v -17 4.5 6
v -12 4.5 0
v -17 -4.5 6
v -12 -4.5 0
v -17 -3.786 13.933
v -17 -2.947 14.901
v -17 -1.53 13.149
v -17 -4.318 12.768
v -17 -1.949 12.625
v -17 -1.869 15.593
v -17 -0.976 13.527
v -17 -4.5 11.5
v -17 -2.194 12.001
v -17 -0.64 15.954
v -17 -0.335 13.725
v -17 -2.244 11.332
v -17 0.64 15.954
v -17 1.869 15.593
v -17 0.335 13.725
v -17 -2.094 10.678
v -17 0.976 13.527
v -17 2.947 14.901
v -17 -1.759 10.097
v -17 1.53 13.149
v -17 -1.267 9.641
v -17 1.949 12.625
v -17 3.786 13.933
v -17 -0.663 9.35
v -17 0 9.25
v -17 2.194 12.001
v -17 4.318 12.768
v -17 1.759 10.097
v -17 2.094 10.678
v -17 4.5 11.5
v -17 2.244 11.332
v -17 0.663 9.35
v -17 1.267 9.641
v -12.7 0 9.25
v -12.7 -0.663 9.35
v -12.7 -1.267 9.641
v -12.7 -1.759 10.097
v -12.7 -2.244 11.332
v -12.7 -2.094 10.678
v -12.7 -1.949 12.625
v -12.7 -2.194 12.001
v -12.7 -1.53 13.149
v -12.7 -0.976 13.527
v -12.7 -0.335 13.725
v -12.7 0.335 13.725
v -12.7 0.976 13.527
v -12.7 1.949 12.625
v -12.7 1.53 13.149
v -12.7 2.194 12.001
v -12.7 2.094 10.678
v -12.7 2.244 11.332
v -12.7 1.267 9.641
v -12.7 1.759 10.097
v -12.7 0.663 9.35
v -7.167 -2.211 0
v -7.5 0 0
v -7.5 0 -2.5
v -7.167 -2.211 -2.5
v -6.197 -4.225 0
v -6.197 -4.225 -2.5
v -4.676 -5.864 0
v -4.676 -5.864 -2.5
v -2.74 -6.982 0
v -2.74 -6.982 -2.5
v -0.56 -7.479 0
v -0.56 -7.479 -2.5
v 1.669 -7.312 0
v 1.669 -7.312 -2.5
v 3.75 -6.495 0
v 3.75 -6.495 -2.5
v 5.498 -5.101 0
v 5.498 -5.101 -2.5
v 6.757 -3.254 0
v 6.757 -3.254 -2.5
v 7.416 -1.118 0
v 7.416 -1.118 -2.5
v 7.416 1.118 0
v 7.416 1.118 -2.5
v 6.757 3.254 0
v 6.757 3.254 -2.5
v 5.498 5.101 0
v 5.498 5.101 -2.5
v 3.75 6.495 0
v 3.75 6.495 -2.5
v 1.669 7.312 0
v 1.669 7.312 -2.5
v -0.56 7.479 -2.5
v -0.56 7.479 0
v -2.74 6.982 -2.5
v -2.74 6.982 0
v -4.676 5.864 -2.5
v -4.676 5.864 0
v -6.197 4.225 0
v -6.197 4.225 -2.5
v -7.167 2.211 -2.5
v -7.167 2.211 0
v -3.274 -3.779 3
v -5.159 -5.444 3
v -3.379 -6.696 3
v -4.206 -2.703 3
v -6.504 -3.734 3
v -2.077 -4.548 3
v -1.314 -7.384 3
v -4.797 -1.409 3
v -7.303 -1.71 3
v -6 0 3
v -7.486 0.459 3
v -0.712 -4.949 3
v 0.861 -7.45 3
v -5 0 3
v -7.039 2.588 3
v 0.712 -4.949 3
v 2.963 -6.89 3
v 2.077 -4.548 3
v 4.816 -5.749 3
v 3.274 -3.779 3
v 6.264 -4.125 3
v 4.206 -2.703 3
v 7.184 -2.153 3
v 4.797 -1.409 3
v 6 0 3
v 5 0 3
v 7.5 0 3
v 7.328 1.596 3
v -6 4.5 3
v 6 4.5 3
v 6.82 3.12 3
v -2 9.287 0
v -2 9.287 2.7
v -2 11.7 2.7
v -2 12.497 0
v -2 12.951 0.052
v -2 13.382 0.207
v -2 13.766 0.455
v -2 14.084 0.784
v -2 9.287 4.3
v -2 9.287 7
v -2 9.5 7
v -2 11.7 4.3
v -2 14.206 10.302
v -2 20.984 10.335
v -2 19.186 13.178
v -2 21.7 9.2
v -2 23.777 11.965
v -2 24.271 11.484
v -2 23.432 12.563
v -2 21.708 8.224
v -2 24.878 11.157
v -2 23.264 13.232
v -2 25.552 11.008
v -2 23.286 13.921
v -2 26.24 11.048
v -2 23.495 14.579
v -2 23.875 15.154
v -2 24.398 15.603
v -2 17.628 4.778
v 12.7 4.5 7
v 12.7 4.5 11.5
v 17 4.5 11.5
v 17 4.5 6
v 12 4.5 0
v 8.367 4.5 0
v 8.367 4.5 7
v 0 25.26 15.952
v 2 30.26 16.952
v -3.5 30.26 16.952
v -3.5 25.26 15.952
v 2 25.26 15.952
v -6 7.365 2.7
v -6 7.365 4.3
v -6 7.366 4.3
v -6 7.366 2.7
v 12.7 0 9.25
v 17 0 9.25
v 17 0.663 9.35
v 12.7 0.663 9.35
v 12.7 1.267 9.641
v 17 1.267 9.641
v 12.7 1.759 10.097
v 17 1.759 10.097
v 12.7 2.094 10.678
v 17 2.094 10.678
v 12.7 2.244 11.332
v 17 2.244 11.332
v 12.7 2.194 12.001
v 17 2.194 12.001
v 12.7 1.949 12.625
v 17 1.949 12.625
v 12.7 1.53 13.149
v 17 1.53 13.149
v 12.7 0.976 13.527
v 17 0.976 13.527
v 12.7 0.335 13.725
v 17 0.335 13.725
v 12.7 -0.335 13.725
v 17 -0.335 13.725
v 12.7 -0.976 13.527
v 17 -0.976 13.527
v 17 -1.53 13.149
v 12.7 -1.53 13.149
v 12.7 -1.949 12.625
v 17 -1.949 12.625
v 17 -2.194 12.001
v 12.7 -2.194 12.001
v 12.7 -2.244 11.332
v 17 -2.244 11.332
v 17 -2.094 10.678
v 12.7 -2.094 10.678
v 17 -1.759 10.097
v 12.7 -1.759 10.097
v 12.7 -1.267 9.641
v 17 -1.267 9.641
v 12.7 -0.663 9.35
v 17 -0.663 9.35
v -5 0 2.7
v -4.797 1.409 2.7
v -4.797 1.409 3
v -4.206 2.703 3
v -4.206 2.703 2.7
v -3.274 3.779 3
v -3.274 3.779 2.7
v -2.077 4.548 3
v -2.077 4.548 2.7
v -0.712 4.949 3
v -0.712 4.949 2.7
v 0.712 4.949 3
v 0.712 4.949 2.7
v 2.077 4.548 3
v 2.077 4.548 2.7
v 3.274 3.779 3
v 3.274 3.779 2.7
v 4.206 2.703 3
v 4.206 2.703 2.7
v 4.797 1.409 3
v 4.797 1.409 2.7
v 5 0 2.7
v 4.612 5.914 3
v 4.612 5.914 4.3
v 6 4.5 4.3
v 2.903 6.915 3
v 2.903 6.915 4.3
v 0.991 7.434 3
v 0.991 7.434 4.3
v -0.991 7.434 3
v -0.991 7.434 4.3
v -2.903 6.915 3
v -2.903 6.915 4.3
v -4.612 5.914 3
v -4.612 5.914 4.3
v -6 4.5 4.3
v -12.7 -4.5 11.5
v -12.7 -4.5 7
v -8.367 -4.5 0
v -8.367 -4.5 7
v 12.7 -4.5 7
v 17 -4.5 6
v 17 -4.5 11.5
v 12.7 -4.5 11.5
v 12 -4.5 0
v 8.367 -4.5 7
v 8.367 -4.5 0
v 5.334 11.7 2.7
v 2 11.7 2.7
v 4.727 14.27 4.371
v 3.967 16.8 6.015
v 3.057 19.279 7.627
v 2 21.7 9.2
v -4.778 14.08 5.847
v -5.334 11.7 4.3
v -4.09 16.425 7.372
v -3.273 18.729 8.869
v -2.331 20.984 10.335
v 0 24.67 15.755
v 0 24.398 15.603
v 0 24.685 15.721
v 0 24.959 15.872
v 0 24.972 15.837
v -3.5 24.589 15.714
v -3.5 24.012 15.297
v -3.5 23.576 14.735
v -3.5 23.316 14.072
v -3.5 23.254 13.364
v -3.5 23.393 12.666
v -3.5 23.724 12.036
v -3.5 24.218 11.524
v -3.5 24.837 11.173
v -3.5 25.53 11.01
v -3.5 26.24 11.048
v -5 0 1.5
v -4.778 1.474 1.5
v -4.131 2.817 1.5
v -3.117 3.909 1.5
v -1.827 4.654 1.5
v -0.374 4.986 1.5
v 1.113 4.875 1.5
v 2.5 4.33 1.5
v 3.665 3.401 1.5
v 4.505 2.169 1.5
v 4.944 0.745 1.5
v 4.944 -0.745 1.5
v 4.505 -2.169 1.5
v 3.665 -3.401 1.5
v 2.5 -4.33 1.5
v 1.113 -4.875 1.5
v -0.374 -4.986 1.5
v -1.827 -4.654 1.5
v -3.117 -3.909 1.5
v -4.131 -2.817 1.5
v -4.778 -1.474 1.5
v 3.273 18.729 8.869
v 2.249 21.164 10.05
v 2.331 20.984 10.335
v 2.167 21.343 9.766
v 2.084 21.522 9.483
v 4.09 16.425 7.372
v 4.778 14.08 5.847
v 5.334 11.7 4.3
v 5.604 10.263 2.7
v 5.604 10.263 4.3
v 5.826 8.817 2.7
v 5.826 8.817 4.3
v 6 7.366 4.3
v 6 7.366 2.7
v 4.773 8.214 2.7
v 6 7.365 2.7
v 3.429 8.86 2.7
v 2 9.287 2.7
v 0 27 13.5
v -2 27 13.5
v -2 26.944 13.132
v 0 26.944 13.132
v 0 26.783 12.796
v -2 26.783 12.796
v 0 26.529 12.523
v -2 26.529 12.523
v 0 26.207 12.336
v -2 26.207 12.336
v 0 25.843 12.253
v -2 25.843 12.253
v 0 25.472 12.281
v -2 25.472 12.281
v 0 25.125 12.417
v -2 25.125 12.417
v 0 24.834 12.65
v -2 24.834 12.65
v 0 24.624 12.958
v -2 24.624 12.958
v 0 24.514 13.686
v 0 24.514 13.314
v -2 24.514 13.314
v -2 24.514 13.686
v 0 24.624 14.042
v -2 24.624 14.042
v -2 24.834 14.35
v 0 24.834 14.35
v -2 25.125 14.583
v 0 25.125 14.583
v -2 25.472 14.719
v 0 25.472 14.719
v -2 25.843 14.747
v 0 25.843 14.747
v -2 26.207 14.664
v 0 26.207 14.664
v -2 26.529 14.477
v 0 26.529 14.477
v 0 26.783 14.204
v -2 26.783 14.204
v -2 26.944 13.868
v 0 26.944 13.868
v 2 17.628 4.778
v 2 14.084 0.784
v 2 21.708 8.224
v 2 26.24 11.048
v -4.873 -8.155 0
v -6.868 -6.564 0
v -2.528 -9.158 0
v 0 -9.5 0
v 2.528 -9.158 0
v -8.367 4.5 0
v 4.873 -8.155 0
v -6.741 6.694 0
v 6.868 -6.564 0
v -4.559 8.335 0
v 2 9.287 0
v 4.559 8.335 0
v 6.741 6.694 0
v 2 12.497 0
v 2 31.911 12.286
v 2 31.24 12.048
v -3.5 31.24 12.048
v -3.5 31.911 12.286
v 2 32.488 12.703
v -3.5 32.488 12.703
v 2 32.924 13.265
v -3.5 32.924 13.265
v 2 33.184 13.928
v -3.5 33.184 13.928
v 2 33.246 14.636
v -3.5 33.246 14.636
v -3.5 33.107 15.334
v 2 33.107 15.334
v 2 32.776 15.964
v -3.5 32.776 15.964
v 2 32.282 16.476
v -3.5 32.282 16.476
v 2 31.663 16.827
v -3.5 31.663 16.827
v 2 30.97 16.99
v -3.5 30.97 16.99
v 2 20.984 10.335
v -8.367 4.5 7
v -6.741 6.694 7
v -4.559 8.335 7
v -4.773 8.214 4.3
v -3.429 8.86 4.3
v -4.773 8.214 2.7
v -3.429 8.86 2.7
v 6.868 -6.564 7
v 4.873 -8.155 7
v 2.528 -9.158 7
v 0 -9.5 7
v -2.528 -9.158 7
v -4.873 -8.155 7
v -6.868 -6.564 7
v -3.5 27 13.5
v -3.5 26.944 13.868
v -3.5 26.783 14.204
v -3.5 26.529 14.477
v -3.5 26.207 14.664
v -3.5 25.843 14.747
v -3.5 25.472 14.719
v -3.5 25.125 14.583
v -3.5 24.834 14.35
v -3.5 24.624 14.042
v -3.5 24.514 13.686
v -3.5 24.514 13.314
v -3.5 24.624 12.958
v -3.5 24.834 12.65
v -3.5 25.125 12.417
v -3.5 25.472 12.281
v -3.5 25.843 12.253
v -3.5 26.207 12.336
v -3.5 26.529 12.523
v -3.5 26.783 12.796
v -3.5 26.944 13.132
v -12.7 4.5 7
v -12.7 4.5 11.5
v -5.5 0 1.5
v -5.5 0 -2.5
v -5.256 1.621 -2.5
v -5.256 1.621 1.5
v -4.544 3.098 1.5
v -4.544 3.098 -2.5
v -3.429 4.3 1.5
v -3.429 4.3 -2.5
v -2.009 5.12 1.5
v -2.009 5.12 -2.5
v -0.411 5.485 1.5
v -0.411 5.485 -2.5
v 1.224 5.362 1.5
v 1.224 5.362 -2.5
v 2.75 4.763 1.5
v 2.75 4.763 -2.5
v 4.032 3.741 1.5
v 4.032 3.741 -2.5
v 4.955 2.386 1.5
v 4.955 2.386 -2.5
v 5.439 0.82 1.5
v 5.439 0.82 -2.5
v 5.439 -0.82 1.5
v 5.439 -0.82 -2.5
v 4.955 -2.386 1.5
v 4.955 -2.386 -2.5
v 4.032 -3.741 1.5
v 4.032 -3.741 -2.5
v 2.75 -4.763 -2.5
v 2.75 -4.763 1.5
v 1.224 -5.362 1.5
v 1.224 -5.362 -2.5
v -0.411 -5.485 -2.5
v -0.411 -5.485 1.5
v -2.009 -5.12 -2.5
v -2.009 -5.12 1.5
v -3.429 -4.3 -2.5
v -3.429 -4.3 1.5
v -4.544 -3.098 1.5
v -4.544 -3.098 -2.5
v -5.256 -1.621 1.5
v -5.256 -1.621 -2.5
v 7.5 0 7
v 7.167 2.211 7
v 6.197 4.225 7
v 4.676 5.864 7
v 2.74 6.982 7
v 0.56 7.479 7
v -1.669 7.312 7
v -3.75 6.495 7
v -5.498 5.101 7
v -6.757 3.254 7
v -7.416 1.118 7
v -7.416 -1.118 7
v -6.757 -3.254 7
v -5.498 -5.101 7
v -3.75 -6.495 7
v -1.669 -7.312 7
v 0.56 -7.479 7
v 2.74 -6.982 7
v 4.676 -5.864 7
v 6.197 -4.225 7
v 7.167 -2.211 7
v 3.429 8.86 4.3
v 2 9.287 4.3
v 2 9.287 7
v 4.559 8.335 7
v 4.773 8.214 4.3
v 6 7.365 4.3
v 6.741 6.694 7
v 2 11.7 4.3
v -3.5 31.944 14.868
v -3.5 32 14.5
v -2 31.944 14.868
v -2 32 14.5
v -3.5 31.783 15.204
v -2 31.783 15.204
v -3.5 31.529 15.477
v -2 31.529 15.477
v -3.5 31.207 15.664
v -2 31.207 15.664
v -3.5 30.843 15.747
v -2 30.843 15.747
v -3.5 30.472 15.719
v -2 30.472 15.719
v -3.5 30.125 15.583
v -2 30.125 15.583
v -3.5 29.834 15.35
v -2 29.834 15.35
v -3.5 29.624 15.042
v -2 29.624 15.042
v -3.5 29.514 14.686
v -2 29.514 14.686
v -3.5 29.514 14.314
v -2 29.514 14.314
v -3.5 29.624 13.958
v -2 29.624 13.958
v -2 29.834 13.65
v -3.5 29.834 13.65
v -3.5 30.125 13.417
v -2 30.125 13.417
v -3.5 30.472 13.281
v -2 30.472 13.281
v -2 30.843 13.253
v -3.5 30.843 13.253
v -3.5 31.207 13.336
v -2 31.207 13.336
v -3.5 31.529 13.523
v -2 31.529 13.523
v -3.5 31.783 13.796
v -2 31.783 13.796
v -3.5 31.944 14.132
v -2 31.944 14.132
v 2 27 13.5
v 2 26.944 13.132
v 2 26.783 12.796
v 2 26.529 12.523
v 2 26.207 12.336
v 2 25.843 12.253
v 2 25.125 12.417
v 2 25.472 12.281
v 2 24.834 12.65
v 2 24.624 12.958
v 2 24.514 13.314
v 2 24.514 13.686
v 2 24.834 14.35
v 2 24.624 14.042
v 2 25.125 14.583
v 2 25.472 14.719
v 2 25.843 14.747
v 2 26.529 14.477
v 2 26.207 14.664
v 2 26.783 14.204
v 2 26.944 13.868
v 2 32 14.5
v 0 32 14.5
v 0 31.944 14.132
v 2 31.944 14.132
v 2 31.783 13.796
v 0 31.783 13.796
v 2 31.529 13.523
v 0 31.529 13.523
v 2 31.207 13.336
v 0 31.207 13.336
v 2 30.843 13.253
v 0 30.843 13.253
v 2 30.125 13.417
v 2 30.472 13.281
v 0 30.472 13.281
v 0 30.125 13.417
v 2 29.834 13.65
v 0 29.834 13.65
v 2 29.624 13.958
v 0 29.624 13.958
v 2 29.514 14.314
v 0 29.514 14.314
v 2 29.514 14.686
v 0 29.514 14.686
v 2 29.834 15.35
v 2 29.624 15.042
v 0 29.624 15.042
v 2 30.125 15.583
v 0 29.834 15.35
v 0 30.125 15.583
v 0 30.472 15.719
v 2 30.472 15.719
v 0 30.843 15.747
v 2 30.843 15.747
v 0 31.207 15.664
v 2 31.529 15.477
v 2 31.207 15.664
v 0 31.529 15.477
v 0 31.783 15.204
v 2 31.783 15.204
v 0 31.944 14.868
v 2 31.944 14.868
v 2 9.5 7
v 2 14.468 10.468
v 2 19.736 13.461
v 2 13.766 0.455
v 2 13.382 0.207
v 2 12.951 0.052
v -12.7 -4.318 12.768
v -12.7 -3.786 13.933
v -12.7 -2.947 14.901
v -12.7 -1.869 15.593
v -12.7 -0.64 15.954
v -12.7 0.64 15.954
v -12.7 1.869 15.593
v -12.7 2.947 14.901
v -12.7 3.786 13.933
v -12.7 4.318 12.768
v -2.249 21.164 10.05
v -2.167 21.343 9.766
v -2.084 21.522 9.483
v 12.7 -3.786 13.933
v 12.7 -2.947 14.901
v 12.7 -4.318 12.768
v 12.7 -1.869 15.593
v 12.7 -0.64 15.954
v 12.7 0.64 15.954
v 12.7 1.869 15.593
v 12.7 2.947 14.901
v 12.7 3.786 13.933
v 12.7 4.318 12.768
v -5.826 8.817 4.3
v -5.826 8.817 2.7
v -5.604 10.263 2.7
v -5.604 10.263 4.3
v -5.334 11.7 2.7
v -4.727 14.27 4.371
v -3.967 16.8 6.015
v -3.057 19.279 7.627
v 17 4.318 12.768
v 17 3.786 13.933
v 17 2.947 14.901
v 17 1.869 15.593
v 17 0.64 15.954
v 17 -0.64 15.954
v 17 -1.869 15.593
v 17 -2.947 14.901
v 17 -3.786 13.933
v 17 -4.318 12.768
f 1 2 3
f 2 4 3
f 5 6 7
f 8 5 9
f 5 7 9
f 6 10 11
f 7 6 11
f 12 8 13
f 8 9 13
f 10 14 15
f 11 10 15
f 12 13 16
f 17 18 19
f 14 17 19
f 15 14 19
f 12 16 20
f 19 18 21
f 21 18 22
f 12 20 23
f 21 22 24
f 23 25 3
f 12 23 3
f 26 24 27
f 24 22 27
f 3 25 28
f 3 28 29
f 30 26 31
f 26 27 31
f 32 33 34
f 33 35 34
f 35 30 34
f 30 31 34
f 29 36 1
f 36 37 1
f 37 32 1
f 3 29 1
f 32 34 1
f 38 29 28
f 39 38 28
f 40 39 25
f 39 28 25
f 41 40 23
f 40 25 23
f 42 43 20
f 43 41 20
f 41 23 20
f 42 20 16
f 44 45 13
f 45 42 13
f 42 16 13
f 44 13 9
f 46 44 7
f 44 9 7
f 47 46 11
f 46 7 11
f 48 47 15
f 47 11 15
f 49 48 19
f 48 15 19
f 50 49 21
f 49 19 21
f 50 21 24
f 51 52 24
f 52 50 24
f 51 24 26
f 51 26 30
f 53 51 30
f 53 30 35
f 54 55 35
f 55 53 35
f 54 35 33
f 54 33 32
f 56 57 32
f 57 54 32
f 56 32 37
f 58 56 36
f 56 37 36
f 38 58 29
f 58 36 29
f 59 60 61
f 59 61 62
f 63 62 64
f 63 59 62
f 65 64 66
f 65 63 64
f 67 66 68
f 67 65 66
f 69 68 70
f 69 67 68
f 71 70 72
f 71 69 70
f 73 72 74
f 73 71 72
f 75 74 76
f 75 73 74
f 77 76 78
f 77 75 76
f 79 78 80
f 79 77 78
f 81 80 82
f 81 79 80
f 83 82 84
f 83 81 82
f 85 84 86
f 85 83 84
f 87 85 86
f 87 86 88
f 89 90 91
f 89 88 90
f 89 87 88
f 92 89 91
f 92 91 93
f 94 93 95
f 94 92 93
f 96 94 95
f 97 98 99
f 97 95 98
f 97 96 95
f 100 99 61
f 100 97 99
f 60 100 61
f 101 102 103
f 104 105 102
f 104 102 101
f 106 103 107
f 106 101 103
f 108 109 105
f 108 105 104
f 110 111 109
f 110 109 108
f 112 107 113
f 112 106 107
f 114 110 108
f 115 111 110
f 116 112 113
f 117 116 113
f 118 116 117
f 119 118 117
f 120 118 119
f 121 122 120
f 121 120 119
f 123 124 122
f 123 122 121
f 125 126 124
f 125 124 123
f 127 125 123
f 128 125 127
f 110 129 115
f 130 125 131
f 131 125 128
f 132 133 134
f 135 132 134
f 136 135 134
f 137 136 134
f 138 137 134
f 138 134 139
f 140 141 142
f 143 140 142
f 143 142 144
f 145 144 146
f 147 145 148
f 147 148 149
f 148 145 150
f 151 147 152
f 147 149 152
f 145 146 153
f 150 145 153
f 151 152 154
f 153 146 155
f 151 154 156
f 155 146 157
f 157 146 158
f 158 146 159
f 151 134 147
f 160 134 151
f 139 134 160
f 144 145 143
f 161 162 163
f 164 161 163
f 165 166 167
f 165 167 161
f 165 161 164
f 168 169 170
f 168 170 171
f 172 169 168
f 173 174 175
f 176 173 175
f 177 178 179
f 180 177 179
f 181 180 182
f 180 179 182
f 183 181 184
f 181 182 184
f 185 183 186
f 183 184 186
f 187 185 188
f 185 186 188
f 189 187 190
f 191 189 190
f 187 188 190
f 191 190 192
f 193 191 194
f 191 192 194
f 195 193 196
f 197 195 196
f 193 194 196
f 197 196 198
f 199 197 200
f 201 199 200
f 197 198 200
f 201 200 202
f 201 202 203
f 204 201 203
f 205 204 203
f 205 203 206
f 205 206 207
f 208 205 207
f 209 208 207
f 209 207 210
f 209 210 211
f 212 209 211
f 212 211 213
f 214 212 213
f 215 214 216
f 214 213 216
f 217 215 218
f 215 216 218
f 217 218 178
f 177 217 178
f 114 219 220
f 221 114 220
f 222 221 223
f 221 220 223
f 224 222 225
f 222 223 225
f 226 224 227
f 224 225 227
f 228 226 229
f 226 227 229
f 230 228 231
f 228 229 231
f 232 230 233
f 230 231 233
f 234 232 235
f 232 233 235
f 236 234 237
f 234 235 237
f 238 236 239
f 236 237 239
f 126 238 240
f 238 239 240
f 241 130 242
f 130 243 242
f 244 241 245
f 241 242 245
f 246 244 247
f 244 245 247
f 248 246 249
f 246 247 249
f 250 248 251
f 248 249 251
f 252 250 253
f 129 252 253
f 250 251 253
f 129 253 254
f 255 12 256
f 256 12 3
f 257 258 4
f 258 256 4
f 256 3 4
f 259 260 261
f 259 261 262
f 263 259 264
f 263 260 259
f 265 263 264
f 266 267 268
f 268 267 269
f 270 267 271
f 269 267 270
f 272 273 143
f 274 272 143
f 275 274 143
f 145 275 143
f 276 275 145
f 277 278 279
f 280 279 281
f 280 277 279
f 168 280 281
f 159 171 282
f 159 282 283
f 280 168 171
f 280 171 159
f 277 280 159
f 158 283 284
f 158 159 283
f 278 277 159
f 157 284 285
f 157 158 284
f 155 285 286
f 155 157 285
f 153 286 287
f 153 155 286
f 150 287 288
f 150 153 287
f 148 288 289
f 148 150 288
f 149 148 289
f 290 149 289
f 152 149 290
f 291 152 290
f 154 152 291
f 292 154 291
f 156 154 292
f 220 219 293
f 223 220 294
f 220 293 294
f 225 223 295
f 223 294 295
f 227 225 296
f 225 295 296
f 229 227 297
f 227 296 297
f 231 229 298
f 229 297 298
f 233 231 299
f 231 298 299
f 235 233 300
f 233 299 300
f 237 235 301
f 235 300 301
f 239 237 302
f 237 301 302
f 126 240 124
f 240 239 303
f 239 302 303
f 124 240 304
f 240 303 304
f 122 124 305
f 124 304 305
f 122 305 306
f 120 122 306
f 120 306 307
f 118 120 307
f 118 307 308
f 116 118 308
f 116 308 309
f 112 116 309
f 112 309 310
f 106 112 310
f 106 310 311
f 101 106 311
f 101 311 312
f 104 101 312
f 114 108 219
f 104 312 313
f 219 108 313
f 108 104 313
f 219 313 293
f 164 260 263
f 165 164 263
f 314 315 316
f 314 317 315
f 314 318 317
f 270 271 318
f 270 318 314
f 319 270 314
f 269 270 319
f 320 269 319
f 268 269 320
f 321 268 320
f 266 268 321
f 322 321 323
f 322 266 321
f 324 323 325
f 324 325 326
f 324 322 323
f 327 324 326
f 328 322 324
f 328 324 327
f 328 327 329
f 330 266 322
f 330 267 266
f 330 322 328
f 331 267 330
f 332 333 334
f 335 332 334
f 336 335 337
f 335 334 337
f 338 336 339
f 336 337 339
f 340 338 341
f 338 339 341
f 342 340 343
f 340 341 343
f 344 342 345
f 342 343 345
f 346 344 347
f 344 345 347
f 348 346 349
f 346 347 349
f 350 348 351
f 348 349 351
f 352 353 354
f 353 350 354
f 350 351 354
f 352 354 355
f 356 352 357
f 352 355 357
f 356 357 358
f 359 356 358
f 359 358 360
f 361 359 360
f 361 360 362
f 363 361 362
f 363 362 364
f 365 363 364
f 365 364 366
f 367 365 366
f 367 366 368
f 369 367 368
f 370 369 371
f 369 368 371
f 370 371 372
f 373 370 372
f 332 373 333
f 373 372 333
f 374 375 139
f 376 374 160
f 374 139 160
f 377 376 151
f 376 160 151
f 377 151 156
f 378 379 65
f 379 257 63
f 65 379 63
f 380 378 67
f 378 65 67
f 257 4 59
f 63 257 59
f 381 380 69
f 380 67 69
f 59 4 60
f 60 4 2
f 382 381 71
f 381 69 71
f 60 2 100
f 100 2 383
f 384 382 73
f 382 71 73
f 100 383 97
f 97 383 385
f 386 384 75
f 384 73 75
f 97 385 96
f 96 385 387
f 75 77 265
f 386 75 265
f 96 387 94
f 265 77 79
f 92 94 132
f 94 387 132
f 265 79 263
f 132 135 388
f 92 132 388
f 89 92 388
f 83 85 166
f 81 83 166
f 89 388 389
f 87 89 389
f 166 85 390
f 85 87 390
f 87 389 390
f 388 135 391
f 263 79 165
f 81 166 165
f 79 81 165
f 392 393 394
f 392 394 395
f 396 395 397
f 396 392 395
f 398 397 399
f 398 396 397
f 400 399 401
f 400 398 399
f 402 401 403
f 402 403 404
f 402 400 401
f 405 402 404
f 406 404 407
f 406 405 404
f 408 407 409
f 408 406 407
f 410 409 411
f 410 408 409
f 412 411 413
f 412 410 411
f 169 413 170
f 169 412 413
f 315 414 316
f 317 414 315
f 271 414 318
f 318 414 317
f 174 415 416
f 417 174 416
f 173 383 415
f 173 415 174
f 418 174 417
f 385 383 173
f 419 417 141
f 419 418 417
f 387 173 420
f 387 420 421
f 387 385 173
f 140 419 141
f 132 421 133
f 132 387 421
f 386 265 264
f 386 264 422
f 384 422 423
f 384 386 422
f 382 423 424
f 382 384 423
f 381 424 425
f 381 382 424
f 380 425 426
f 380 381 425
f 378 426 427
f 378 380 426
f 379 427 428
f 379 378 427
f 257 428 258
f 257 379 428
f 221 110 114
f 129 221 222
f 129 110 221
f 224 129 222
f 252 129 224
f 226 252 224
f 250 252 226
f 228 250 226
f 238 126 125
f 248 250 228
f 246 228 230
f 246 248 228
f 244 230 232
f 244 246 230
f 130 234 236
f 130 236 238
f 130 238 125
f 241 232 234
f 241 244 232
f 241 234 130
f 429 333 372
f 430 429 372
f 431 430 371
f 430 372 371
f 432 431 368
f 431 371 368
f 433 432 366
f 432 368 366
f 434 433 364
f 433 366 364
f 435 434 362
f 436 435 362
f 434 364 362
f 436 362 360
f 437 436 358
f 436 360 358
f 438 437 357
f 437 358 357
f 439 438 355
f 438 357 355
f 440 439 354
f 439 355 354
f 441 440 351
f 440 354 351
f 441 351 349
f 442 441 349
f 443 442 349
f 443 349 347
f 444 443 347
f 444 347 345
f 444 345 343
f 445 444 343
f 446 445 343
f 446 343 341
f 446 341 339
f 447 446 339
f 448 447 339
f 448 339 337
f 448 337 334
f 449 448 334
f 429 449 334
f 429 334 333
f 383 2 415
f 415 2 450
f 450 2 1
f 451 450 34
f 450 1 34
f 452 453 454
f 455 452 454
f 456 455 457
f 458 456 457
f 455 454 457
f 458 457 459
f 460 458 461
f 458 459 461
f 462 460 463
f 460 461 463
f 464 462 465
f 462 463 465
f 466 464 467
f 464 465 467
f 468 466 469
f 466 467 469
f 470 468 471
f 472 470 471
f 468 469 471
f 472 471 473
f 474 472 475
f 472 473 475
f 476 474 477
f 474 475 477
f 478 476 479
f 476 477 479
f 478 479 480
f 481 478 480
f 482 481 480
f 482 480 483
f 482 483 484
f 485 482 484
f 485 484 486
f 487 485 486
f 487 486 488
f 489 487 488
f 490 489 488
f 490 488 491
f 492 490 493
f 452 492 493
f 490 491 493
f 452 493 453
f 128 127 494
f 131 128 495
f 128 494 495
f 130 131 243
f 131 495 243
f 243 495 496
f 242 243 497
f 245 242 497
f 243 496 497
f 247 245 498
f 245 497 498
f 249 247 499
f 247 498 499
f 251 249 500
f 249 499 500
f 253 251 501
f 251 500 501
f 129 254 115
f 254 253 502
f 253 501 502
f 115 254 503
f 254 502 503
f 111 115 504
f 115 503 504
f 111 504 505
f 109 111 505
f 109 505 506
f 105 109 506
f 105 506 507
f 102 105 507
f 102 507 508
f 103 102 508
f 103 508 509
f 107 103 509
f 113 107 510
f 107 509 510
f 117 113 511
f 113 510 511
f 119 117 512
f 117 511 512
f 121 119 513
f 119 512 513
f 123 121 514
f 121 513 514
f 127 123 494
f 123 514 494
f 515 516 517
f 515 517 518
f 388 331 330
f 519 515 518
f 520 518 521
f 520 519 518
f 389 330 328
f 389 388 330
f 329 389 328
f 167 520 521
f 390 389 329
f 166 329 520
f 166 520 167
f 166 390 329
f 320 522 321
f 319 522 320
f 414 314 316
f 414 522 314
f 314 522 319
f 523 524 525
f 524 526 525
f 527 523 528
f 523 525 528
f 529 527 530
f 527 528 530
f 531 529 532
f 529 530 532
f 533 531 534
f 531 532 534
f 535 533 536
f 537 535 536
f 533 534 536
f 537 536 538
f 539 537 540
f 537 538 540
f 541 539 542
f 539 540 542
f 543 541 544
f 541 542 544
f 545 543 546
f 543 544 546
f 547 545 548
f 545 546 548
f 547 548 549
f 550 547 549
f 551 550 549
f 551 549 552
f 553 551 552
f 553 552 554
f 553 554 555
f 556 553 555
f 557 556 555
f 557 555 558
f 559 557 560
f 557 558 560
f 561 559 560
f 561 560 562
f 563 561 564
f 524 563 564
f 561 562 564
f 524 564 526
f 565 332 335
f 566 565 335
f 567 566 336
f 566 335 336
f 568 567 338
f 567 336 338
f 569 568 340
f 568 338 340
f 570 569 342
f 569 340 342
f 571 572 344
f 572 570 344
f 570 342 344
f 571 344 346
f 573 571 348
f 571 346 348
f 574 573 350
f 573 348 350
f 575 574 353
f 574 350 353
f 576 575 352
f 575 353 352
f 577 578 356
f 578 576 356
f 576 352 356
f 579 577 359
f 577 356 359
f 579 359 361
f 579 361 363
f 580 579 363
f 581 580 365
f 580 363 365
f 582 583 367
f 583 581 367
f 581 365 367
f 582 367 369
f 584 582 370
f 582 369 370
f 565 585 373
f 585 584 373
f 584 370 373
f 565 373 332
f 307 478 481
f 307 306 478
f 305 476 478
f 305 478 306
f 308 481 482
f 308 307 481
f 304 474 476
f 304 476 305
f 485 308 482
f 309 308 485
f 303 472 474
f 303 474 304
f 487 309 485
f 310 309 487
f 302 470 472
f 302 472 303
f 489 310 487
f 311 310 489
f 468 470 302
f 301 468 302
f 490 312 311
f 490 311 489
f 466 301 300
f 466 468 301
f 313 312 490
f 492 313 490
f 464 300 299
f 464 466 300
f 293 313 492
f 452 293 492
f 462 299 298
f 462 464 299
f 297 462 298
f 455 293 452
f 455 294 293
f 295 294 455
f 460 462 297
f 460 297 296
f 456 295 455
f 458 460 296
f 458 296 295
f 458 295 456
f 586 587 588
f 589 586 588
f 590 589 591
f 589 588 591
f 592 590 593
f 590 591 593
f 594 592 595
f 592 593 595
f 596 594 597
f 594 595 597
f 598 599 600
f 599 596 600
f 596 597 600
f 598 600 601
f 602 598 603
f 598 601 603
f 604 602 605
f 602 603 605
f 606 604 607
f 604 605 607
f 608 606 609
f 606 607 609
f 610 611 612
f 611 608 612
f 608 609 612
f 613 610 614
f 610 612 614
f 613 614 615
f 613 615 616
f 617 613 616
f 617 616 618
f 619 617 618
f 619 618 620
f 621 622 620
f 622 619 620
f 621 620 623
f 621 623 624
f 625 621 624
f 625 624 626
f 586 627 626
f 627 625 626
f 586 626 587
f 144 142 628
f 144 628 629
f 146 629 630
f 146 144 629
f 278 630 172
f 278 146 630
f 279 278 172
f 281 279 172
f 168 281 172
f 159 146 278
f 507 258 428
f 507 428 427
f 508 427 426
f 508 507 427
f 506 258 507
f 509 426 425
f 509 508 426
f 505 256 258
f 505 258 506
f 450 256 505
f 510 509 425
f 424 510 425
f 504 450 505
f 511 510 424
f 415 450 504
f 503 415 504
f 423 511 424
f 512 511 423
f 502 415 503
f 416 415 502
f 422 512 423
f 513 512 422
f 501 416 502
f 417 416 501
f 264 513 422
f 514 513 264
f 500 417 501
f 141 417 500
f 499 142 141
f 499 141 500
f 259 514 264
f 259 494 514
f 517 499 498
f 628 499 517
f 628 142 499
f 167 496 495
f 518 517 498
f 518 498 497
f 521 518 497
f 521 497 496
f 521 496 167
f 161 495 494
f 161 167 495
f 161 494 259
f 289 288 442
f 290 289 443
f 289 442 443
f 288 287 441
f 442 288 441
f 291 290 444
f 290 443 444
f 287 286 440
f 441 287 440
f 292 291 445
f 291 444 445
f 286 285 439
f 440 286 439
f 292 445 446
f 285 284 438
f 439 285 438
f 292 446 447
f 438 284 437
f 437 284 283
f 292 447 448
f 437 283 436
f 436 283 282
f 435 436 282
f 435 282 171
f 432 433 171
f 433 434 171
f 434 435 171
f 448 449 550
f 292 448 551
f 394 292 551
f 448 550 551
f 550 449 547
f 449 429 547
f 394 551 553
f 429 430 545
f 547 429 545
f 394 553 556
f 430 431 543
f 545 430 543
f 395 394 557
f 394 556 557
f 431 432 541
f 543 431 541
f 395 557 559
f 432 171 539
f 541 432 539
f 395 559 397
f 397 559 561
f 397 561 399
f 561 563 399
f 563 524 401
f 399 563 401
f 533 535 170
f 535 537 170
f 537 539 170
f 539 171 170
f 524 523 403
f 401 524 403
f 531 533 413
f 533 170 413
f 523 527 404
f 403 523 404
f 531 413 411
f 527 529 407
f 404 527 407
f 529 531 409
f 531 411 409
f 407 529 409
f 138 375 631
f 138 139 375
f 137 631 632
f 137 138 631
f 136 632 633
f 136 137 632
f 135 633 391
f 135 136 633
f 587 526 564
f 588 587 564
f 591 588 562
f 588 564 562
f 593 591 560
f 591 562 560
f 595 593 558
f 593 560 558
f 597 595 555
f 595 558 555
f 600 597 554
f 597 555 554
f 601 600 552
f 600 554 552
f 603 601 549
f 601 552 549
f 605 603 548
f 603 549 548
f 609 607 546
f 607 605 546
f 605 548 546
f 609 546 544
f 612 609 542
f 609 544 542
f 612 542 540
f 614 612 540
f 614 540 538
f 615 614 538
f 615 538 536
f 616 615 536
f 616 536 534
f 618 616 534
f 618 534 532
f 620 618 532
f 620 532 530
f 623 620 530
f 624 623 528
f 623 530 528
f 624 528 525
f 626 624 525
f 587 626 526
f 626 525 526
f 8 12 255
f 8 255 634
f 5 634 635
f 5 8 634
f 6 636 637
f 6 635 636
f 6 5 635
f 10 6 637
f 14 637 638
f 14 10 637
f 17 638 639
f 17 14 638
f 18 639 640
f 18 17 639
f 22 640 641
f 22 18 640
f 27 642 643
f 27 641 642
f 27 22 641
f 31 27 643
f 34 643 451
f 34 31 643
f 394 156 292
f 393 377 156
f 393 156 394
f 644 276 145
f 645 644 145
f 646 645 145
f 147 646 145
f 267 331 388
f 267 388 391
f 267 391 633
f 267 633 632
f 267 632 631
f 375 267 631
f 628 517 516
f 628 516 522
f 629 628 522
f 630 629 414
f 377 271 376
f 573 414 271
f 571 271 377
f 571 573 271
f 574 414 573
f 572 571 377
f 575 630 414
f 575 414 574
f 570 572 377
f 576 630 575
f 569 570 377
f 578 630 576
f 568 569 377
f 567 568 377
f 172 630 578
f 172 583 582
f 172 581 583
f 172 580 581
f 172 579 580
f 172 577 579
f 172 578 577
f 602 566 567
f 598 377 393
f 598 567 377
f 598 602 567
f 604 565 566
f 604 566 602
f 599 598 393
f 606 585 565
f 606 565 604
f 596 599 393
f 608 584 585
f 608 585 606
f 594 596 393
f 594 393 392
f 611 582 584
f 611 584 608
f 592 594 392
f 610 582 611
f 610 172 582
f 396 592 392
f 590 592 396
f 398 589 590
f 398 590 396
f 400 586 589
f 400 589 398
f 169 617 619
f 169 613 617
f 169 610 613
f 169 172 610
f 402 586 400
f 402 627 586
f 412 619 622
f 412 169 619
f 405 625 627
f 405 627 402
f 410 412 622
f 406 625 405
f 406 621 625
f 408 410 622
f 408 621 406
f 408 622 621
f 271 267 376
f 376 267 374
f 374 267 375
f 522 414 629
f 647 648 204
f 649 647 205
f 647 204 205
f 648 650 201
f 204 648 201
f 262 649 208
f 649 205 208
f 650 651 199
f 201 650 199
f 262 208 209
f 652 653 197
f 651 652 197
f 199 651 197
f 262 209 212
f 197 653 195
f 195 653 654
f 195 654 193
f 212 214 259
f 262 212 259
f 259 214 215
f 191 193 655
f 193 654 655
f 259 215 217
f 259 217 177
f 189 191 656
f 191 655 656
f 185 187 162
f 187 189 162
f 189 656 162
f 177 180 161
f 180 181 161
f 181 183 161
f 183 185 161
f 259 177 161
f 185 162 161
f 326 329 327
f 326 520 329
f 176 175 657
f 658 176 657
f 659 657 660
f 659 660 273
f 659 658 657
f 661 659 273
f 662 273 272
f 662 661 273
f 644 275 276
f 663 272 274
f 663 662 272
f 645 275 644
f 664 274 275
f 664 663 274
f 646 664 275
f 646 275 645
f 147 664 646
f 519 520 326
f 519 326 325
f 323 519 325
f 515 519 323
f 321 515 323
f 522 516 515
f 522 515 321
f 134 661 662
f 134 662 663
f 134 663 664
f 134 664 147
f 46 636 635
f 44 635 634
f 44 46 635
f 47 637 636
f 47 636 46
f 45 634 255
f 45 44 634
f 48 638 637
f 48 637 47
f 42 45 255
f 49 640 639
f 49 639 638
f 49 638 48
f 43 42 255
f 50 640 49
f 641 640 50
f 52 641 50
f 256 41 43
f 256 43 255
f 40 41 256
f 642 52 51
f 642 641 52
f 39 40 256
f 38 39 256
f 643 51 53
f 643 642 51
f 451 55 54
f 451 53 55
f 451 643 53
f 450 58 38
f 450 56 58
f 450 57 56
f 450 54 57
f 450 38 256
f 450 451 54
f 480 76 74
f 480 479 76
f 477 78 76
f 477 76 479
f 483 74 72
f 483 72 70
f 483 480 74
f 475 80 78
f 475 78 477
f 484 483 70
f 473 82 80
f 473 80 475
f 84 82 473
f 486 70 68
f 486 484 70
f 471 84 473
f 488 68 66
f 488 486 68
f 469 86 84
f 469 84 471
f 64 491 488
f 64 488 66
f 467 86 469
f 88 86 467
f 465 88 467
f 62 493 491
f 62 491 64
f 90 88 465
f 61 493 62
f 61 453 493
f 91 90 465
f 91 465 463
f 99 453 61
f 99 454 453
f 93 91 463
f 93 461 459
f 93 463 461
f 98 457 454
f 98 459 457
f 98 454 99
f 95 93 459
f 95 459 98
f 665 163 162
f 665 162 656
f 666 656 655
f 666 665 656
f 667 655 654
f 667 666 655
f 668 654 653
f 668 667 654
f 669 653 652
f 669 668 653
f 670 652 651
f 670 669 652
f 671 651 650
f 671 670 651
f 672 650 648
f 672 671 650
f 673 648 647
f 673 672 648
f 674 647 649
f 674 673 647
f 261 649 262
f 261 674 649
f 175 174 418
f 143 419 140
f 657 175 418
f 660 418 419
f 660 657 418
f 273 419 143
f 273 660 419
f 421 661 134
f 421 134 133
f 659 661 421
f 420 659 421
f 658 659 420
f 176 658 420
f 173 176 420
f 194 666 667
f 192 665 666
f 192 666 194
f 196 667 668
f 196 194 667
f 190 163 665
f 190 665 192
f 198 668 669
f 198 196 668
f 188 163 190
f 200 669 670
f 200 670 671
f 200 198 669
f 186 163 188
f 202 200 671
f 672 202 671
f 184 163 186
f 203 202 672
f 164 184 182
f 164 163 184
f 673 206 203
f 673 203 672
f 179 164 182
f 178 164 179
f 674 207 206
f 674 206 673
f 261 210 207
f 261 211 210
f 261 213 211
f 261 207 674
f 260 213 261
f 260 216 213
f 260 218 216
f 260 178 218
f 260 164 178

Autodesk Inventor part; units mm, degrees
ref_plane "YZ Plane" through (0, 0, 0) normal (1, 0, 0) x (0, 1, 0)
ref_plane "XZ Plane" through (0, 0, 0) normal (0, 1, 0) x (-1, 0, 0)
ref_plane "XY Plane" through (0, 0, 0) normal (0, 0, 1) x (1, 0, 0)
sketch "Sketch1" plane through (0, 0, 0) normal (0, 0, 1) x (1, 0, 0)
  line L0 (17, 4.5) -> (17, -4.5)
  line L1 (-17, -4.5) -> (-17, 4.5)
  arc A0 (-8.3666, -4.5) -> (8.3666, -4.5) centre (0, 0) ccw
  arc A1 (8.3666, 4.5) -> (-8.3666, 4.5) centre (0, 0) ccw
  line L2 (-17, 4.5) -> (-8.3666, 4.5)
  line L3 (8.3666, 4.5) -> (17, 4.5)
  line L4 (17, -4.5) -> (8.3666, -4.5)
  line L5 (-8.3666, -4.5) -> (-17, -4.5)
  line L6 (-17, 4.5) -> (17, -4.5) construction
  line L7 (-17, -4.5) -> (17, 4.5) construction
  point P0 (0, 0)
  point P1 (0, 0)
  dimension "d0" = 9
  dimension "d1" = 34
  dimension "d2" = 9.5
  dimension "d3" = 9
  dimension "d4" = 9.5
  dimension "d12" = 4.5
extrude "Extrusion1" add sketch "Sketch1" along normal blind 7
sketch "Sketch2" plane through (17, -4.5, 0) normal (1, 0, 0) x (0, 0, -1)
  arc A0 (-11.5, 9) -> (-11.5, 0) centre (-11.5, 4.5) ccw
  circle A1 centre (-11.5, 4.5) radius 2.25
  line L0 (-7, 9) -> (-11.5, 9)
  line L1 (-11.5, 0) -> (-7, 0)
  line L2 (-7, 0) -> (-7, 9)
  point P0 (0, 4.5)
  point P1 (-7, 0)
  dimension "d7" = 9
  dimension "d8" = 4.5
  dimension "d9" = 9
extrude "Extrusion2" add sketch "Sketch2" against normal blind 4.3
extrude "Extrusion3" add sketch "Sketch2" along normal blind 4.3 from surface at -34
sketch "Sketch3" plane through (-17, -4.5, 0) normal (0, -1, 0) x (1, 0, 0)
  line L0 (0, 6) -> (0, 0)
  line L1 (0, 0) -> (5, 0)
  line L2 (5, 0) -> (0, 6)
  line L3 (29, 0) -> (34, 0)
  line L4 (34, 0) -> (34, 6)
  line L5 (34, 6) -> (29, 0)
  point P0 (17, 0)
  dimension "d15" = 6
  dimension "d16" = 5
  dimension "d17" = 6
  dimension "d18" = 5
extrude "Extrusion4" cut sketch "Sketch3" against normal up to next
sketch "Sketch4" plane through (0, 0, 0) normal (0, 0, -1) x (-1, 0, 0)
  circle A0 centre (0, 0) radius 7.5
  dimension "d21" = 15
extrude "Extrusion5" add sketch "Sketch4" along normal blind 2.5
sketch "Sketch5" plane through (0, 0, 7) normal (0, 0, 1) x (1, 0, 0)
  circle A0 centre (0, 0) radius 7.5
  dimension "d24" = 15
extrude "Extrusion6" cut sketch "Sketch5" against normal blind 4
sketch "Sketch6" plane through (0, 0, -2.5) normal (0, 0, -1) x (-1, 0, 0)
  circle A0 centre (0, 0) radius 5.5
  dimension "d27" = 11
extrude "Extrusion7" cut sketch "Sketch6" against normal blind 4
sketch "Sketch7" plane through (0, 0, 1.5) normal (0, 0, -1) x (-1, 0, 0)
  circle A0 centre (0, 0) radius 5
  dimension "d30" = 10
extrude "Extrusion8" cut sketch "Sketch7" against normal up to next
sketch "Sketch9" plane through (0, 0, 0) normal (1, 0, 0) x (0, 1, 0)
  line L0 (-9.5504, 0) -> (57.3026, 0) projected
  line L1 (0, -37.6235) -> (0, 29.8791) projected
  line L2 (9.5, 0) -> (4.5, 0) projected
  line L3 (9.5, 7) -> (4.5, 7) projected
  circle A0 centre (30.75, 14.5) radius 1.25
  circle A1 centre (25.75, 13.5) radius 1.25
  line L4 (8.5, 7) -> (9.5, 7)
  line L5 (13.5, 7) -> (13.5, 0) construction
  line L6 (12.4966, 0) -> (8.5, 0)
  line L7 (8.5, 0) -> (8.5, 7)
  line L8 (25.75, 13.5) -> (30.75, 14.5) construction
  line L9 (26.2403, 11.0485) -> (31.2403, 12.0485)
  line L10 (30.2597, 16.9515) -> (25.2597, 15.9515)
  arc A2 (25.2597, 15.9515) -> (26.2403, 11.0485) centre (25.75, 13.5) ccw construction
  arc A3 (31.2403, 12.0485) -> (30.2597, 16.9515) centre (30.75, 14.5) ccw
  arc A4 (25.2597, 15.9515) -> (9.5, 7) centre (49.2826, -44.6916) ccw
  arc A5 (26.2403, 11.0485) -> (14.0842, 0.7836) centre (43.5805, -21.8166) ccw
  arc A6 (12.4966, 0) -> (14.0842, 0.7836) centre (12.4966, 2) ccw
  point P0 (0, 0)
  point P1 (28.25, 14)
  dimension "d133" = 2.5
  dimension "d134" = 30.75
  dimension "d135" = 14.5
  dimension "d136" = 2.5
  dimension "d137" = 13.5
  dimension "d138" = 25.75
  dimension "d139" = 7
  dimension "d140" = 5
  dimension "d141" = 8.5
  dimension "d142" = 5
  dimension "d143" = 65.2279
  dimension "d144" = 37.1592
  dimension "d145" = 2
extrude "Extrusion22" add sketch "Sketch9" along normal mid plane 4
sketch "Sketch19" plane through (0, 0, 0) normal (1, 0, 0) x (0, 1, 0)
  circle A0 centre (25.75, 13.5) radius 1.25 projected
  circle A1 centre (25.75, 13.5) radius 1.25
  circle A2 centre (30.75, 14.5) radius 1.25 projected
  circle A3 centre (30.75, 14.5) radius 1.25
  line L0 (25.75, 13.5) -> (30.75, 14.5) construction
  line L1 (26.2403, 11.0485) -> (31.2403, 12.0485)
  line L2 (30.2597, 16.9515) -> (25.2597, 15.9515)
  arc A4 (25.2597, 15.9515) -> (26.2403, 11.0485) centre (25.75, 13.5) ccw
  arc A5 (31.2403, 12.0485) -> (30.2597, 16.9515) centre (30.75, 14.5) ccw
  point P0 (0, 0)
  point P1 (28.25, 14)
  dimension "d148" = 2.5
  dimension "d149" = 2.5
  dimension "d150" = 5
extrude "Extrusion23" add sketch "Sketch19" against normal blind 3.5
sketch "Sketch20" plane through (0, 0, 0) normal (1, 0, 0) x (0, 1, 0)
  line L0 (0, 4.3) -> (11.7, 4.3)
  line L1 (11.7, 4.3) -> (11.7, 2.7) construction
  line L2 (11.7, 2.7) -> (0, 2.7)
  line L3 (0, 2.7) -> (0, 4.3)
  line L4 (-18.05, 0) -> (41.8, 0) projected
  line L5 (0, -6.4) -> (0, 20.9) projected
  line L6 (11.7, 2.7) -> (21.7, 9.2)
  line L7 (11.7, 4.3) -> (20.9843, 10.3348)
  line L8 (20.9843, 10.3348) -> (21.7, 9.2)
  point P0 (0, 0)
  dimension "d153" = 1.6
  dimension "d154" = 11.7
  dimension "d155" = 2.7
  dimension "d156" = 10
  dimension "d157" = 6.5
  dimension "d158" = 1.1348
extrude "Extrusion24" add sketch "Sketch20" along normal mid plane 12
sketch "Sketch21" plane through (0, 0, 7) normal (0, 0, 1) x (1, 0, 0)
  circle A0 centre (0, 0) radius 7.5
  dimension "d161" = 15
extrude "Extrusion25" cut sketch "Sketch5" against normal blind 4
sketch "Sketch22" plane through (0, 0, 1.5) normal (0, 0, -1) x (-1, 0, 0)
  circle A0 centre (0, 0) radius 5
  dimension "d164" = 10
extrude "Extrusion26" cut sketch "Sketch22" against normal through all
sketch "Sketch23" plane through (0, 0, 0) normal (0, 0, 1) x (1, 0, 0)
  line L0 (-6, 21.7) -> (-2, 21.7) projected
  line L1 (-6, 21.7) -> (-6, 11.7) projected
  line L2 (-2, 21.7) -> (-6, 21.7)
  line L3 (-6, 7.3655) -> (-6, 11.7) projected
  line L4 (-6, 21.7) -> (-6, 7.3655)
  arc A0 (-2, 21.7) -> (-6, 7.3655) centre (37.8943, 2.8423) ccw
  line L5 (0, 17.7237) -> (0, 15.5632) construction
  line L6 (6, 21.7) -> (2, 21.7)
  line L7 (6, 21.7) -> (6, 11.7)
  line L8 (6, 7.3655) -> (6, 11.7)
  arc A1 (6, 7.3655) -> (2, 21.7) centre (-37.8943, 2.8423) ccw
  point P0 (0, 0)
extrude "Extrusion27" cut sketch "Sketch23" along normal through all
properties part number "RCT-P006_steering_knuckle"
